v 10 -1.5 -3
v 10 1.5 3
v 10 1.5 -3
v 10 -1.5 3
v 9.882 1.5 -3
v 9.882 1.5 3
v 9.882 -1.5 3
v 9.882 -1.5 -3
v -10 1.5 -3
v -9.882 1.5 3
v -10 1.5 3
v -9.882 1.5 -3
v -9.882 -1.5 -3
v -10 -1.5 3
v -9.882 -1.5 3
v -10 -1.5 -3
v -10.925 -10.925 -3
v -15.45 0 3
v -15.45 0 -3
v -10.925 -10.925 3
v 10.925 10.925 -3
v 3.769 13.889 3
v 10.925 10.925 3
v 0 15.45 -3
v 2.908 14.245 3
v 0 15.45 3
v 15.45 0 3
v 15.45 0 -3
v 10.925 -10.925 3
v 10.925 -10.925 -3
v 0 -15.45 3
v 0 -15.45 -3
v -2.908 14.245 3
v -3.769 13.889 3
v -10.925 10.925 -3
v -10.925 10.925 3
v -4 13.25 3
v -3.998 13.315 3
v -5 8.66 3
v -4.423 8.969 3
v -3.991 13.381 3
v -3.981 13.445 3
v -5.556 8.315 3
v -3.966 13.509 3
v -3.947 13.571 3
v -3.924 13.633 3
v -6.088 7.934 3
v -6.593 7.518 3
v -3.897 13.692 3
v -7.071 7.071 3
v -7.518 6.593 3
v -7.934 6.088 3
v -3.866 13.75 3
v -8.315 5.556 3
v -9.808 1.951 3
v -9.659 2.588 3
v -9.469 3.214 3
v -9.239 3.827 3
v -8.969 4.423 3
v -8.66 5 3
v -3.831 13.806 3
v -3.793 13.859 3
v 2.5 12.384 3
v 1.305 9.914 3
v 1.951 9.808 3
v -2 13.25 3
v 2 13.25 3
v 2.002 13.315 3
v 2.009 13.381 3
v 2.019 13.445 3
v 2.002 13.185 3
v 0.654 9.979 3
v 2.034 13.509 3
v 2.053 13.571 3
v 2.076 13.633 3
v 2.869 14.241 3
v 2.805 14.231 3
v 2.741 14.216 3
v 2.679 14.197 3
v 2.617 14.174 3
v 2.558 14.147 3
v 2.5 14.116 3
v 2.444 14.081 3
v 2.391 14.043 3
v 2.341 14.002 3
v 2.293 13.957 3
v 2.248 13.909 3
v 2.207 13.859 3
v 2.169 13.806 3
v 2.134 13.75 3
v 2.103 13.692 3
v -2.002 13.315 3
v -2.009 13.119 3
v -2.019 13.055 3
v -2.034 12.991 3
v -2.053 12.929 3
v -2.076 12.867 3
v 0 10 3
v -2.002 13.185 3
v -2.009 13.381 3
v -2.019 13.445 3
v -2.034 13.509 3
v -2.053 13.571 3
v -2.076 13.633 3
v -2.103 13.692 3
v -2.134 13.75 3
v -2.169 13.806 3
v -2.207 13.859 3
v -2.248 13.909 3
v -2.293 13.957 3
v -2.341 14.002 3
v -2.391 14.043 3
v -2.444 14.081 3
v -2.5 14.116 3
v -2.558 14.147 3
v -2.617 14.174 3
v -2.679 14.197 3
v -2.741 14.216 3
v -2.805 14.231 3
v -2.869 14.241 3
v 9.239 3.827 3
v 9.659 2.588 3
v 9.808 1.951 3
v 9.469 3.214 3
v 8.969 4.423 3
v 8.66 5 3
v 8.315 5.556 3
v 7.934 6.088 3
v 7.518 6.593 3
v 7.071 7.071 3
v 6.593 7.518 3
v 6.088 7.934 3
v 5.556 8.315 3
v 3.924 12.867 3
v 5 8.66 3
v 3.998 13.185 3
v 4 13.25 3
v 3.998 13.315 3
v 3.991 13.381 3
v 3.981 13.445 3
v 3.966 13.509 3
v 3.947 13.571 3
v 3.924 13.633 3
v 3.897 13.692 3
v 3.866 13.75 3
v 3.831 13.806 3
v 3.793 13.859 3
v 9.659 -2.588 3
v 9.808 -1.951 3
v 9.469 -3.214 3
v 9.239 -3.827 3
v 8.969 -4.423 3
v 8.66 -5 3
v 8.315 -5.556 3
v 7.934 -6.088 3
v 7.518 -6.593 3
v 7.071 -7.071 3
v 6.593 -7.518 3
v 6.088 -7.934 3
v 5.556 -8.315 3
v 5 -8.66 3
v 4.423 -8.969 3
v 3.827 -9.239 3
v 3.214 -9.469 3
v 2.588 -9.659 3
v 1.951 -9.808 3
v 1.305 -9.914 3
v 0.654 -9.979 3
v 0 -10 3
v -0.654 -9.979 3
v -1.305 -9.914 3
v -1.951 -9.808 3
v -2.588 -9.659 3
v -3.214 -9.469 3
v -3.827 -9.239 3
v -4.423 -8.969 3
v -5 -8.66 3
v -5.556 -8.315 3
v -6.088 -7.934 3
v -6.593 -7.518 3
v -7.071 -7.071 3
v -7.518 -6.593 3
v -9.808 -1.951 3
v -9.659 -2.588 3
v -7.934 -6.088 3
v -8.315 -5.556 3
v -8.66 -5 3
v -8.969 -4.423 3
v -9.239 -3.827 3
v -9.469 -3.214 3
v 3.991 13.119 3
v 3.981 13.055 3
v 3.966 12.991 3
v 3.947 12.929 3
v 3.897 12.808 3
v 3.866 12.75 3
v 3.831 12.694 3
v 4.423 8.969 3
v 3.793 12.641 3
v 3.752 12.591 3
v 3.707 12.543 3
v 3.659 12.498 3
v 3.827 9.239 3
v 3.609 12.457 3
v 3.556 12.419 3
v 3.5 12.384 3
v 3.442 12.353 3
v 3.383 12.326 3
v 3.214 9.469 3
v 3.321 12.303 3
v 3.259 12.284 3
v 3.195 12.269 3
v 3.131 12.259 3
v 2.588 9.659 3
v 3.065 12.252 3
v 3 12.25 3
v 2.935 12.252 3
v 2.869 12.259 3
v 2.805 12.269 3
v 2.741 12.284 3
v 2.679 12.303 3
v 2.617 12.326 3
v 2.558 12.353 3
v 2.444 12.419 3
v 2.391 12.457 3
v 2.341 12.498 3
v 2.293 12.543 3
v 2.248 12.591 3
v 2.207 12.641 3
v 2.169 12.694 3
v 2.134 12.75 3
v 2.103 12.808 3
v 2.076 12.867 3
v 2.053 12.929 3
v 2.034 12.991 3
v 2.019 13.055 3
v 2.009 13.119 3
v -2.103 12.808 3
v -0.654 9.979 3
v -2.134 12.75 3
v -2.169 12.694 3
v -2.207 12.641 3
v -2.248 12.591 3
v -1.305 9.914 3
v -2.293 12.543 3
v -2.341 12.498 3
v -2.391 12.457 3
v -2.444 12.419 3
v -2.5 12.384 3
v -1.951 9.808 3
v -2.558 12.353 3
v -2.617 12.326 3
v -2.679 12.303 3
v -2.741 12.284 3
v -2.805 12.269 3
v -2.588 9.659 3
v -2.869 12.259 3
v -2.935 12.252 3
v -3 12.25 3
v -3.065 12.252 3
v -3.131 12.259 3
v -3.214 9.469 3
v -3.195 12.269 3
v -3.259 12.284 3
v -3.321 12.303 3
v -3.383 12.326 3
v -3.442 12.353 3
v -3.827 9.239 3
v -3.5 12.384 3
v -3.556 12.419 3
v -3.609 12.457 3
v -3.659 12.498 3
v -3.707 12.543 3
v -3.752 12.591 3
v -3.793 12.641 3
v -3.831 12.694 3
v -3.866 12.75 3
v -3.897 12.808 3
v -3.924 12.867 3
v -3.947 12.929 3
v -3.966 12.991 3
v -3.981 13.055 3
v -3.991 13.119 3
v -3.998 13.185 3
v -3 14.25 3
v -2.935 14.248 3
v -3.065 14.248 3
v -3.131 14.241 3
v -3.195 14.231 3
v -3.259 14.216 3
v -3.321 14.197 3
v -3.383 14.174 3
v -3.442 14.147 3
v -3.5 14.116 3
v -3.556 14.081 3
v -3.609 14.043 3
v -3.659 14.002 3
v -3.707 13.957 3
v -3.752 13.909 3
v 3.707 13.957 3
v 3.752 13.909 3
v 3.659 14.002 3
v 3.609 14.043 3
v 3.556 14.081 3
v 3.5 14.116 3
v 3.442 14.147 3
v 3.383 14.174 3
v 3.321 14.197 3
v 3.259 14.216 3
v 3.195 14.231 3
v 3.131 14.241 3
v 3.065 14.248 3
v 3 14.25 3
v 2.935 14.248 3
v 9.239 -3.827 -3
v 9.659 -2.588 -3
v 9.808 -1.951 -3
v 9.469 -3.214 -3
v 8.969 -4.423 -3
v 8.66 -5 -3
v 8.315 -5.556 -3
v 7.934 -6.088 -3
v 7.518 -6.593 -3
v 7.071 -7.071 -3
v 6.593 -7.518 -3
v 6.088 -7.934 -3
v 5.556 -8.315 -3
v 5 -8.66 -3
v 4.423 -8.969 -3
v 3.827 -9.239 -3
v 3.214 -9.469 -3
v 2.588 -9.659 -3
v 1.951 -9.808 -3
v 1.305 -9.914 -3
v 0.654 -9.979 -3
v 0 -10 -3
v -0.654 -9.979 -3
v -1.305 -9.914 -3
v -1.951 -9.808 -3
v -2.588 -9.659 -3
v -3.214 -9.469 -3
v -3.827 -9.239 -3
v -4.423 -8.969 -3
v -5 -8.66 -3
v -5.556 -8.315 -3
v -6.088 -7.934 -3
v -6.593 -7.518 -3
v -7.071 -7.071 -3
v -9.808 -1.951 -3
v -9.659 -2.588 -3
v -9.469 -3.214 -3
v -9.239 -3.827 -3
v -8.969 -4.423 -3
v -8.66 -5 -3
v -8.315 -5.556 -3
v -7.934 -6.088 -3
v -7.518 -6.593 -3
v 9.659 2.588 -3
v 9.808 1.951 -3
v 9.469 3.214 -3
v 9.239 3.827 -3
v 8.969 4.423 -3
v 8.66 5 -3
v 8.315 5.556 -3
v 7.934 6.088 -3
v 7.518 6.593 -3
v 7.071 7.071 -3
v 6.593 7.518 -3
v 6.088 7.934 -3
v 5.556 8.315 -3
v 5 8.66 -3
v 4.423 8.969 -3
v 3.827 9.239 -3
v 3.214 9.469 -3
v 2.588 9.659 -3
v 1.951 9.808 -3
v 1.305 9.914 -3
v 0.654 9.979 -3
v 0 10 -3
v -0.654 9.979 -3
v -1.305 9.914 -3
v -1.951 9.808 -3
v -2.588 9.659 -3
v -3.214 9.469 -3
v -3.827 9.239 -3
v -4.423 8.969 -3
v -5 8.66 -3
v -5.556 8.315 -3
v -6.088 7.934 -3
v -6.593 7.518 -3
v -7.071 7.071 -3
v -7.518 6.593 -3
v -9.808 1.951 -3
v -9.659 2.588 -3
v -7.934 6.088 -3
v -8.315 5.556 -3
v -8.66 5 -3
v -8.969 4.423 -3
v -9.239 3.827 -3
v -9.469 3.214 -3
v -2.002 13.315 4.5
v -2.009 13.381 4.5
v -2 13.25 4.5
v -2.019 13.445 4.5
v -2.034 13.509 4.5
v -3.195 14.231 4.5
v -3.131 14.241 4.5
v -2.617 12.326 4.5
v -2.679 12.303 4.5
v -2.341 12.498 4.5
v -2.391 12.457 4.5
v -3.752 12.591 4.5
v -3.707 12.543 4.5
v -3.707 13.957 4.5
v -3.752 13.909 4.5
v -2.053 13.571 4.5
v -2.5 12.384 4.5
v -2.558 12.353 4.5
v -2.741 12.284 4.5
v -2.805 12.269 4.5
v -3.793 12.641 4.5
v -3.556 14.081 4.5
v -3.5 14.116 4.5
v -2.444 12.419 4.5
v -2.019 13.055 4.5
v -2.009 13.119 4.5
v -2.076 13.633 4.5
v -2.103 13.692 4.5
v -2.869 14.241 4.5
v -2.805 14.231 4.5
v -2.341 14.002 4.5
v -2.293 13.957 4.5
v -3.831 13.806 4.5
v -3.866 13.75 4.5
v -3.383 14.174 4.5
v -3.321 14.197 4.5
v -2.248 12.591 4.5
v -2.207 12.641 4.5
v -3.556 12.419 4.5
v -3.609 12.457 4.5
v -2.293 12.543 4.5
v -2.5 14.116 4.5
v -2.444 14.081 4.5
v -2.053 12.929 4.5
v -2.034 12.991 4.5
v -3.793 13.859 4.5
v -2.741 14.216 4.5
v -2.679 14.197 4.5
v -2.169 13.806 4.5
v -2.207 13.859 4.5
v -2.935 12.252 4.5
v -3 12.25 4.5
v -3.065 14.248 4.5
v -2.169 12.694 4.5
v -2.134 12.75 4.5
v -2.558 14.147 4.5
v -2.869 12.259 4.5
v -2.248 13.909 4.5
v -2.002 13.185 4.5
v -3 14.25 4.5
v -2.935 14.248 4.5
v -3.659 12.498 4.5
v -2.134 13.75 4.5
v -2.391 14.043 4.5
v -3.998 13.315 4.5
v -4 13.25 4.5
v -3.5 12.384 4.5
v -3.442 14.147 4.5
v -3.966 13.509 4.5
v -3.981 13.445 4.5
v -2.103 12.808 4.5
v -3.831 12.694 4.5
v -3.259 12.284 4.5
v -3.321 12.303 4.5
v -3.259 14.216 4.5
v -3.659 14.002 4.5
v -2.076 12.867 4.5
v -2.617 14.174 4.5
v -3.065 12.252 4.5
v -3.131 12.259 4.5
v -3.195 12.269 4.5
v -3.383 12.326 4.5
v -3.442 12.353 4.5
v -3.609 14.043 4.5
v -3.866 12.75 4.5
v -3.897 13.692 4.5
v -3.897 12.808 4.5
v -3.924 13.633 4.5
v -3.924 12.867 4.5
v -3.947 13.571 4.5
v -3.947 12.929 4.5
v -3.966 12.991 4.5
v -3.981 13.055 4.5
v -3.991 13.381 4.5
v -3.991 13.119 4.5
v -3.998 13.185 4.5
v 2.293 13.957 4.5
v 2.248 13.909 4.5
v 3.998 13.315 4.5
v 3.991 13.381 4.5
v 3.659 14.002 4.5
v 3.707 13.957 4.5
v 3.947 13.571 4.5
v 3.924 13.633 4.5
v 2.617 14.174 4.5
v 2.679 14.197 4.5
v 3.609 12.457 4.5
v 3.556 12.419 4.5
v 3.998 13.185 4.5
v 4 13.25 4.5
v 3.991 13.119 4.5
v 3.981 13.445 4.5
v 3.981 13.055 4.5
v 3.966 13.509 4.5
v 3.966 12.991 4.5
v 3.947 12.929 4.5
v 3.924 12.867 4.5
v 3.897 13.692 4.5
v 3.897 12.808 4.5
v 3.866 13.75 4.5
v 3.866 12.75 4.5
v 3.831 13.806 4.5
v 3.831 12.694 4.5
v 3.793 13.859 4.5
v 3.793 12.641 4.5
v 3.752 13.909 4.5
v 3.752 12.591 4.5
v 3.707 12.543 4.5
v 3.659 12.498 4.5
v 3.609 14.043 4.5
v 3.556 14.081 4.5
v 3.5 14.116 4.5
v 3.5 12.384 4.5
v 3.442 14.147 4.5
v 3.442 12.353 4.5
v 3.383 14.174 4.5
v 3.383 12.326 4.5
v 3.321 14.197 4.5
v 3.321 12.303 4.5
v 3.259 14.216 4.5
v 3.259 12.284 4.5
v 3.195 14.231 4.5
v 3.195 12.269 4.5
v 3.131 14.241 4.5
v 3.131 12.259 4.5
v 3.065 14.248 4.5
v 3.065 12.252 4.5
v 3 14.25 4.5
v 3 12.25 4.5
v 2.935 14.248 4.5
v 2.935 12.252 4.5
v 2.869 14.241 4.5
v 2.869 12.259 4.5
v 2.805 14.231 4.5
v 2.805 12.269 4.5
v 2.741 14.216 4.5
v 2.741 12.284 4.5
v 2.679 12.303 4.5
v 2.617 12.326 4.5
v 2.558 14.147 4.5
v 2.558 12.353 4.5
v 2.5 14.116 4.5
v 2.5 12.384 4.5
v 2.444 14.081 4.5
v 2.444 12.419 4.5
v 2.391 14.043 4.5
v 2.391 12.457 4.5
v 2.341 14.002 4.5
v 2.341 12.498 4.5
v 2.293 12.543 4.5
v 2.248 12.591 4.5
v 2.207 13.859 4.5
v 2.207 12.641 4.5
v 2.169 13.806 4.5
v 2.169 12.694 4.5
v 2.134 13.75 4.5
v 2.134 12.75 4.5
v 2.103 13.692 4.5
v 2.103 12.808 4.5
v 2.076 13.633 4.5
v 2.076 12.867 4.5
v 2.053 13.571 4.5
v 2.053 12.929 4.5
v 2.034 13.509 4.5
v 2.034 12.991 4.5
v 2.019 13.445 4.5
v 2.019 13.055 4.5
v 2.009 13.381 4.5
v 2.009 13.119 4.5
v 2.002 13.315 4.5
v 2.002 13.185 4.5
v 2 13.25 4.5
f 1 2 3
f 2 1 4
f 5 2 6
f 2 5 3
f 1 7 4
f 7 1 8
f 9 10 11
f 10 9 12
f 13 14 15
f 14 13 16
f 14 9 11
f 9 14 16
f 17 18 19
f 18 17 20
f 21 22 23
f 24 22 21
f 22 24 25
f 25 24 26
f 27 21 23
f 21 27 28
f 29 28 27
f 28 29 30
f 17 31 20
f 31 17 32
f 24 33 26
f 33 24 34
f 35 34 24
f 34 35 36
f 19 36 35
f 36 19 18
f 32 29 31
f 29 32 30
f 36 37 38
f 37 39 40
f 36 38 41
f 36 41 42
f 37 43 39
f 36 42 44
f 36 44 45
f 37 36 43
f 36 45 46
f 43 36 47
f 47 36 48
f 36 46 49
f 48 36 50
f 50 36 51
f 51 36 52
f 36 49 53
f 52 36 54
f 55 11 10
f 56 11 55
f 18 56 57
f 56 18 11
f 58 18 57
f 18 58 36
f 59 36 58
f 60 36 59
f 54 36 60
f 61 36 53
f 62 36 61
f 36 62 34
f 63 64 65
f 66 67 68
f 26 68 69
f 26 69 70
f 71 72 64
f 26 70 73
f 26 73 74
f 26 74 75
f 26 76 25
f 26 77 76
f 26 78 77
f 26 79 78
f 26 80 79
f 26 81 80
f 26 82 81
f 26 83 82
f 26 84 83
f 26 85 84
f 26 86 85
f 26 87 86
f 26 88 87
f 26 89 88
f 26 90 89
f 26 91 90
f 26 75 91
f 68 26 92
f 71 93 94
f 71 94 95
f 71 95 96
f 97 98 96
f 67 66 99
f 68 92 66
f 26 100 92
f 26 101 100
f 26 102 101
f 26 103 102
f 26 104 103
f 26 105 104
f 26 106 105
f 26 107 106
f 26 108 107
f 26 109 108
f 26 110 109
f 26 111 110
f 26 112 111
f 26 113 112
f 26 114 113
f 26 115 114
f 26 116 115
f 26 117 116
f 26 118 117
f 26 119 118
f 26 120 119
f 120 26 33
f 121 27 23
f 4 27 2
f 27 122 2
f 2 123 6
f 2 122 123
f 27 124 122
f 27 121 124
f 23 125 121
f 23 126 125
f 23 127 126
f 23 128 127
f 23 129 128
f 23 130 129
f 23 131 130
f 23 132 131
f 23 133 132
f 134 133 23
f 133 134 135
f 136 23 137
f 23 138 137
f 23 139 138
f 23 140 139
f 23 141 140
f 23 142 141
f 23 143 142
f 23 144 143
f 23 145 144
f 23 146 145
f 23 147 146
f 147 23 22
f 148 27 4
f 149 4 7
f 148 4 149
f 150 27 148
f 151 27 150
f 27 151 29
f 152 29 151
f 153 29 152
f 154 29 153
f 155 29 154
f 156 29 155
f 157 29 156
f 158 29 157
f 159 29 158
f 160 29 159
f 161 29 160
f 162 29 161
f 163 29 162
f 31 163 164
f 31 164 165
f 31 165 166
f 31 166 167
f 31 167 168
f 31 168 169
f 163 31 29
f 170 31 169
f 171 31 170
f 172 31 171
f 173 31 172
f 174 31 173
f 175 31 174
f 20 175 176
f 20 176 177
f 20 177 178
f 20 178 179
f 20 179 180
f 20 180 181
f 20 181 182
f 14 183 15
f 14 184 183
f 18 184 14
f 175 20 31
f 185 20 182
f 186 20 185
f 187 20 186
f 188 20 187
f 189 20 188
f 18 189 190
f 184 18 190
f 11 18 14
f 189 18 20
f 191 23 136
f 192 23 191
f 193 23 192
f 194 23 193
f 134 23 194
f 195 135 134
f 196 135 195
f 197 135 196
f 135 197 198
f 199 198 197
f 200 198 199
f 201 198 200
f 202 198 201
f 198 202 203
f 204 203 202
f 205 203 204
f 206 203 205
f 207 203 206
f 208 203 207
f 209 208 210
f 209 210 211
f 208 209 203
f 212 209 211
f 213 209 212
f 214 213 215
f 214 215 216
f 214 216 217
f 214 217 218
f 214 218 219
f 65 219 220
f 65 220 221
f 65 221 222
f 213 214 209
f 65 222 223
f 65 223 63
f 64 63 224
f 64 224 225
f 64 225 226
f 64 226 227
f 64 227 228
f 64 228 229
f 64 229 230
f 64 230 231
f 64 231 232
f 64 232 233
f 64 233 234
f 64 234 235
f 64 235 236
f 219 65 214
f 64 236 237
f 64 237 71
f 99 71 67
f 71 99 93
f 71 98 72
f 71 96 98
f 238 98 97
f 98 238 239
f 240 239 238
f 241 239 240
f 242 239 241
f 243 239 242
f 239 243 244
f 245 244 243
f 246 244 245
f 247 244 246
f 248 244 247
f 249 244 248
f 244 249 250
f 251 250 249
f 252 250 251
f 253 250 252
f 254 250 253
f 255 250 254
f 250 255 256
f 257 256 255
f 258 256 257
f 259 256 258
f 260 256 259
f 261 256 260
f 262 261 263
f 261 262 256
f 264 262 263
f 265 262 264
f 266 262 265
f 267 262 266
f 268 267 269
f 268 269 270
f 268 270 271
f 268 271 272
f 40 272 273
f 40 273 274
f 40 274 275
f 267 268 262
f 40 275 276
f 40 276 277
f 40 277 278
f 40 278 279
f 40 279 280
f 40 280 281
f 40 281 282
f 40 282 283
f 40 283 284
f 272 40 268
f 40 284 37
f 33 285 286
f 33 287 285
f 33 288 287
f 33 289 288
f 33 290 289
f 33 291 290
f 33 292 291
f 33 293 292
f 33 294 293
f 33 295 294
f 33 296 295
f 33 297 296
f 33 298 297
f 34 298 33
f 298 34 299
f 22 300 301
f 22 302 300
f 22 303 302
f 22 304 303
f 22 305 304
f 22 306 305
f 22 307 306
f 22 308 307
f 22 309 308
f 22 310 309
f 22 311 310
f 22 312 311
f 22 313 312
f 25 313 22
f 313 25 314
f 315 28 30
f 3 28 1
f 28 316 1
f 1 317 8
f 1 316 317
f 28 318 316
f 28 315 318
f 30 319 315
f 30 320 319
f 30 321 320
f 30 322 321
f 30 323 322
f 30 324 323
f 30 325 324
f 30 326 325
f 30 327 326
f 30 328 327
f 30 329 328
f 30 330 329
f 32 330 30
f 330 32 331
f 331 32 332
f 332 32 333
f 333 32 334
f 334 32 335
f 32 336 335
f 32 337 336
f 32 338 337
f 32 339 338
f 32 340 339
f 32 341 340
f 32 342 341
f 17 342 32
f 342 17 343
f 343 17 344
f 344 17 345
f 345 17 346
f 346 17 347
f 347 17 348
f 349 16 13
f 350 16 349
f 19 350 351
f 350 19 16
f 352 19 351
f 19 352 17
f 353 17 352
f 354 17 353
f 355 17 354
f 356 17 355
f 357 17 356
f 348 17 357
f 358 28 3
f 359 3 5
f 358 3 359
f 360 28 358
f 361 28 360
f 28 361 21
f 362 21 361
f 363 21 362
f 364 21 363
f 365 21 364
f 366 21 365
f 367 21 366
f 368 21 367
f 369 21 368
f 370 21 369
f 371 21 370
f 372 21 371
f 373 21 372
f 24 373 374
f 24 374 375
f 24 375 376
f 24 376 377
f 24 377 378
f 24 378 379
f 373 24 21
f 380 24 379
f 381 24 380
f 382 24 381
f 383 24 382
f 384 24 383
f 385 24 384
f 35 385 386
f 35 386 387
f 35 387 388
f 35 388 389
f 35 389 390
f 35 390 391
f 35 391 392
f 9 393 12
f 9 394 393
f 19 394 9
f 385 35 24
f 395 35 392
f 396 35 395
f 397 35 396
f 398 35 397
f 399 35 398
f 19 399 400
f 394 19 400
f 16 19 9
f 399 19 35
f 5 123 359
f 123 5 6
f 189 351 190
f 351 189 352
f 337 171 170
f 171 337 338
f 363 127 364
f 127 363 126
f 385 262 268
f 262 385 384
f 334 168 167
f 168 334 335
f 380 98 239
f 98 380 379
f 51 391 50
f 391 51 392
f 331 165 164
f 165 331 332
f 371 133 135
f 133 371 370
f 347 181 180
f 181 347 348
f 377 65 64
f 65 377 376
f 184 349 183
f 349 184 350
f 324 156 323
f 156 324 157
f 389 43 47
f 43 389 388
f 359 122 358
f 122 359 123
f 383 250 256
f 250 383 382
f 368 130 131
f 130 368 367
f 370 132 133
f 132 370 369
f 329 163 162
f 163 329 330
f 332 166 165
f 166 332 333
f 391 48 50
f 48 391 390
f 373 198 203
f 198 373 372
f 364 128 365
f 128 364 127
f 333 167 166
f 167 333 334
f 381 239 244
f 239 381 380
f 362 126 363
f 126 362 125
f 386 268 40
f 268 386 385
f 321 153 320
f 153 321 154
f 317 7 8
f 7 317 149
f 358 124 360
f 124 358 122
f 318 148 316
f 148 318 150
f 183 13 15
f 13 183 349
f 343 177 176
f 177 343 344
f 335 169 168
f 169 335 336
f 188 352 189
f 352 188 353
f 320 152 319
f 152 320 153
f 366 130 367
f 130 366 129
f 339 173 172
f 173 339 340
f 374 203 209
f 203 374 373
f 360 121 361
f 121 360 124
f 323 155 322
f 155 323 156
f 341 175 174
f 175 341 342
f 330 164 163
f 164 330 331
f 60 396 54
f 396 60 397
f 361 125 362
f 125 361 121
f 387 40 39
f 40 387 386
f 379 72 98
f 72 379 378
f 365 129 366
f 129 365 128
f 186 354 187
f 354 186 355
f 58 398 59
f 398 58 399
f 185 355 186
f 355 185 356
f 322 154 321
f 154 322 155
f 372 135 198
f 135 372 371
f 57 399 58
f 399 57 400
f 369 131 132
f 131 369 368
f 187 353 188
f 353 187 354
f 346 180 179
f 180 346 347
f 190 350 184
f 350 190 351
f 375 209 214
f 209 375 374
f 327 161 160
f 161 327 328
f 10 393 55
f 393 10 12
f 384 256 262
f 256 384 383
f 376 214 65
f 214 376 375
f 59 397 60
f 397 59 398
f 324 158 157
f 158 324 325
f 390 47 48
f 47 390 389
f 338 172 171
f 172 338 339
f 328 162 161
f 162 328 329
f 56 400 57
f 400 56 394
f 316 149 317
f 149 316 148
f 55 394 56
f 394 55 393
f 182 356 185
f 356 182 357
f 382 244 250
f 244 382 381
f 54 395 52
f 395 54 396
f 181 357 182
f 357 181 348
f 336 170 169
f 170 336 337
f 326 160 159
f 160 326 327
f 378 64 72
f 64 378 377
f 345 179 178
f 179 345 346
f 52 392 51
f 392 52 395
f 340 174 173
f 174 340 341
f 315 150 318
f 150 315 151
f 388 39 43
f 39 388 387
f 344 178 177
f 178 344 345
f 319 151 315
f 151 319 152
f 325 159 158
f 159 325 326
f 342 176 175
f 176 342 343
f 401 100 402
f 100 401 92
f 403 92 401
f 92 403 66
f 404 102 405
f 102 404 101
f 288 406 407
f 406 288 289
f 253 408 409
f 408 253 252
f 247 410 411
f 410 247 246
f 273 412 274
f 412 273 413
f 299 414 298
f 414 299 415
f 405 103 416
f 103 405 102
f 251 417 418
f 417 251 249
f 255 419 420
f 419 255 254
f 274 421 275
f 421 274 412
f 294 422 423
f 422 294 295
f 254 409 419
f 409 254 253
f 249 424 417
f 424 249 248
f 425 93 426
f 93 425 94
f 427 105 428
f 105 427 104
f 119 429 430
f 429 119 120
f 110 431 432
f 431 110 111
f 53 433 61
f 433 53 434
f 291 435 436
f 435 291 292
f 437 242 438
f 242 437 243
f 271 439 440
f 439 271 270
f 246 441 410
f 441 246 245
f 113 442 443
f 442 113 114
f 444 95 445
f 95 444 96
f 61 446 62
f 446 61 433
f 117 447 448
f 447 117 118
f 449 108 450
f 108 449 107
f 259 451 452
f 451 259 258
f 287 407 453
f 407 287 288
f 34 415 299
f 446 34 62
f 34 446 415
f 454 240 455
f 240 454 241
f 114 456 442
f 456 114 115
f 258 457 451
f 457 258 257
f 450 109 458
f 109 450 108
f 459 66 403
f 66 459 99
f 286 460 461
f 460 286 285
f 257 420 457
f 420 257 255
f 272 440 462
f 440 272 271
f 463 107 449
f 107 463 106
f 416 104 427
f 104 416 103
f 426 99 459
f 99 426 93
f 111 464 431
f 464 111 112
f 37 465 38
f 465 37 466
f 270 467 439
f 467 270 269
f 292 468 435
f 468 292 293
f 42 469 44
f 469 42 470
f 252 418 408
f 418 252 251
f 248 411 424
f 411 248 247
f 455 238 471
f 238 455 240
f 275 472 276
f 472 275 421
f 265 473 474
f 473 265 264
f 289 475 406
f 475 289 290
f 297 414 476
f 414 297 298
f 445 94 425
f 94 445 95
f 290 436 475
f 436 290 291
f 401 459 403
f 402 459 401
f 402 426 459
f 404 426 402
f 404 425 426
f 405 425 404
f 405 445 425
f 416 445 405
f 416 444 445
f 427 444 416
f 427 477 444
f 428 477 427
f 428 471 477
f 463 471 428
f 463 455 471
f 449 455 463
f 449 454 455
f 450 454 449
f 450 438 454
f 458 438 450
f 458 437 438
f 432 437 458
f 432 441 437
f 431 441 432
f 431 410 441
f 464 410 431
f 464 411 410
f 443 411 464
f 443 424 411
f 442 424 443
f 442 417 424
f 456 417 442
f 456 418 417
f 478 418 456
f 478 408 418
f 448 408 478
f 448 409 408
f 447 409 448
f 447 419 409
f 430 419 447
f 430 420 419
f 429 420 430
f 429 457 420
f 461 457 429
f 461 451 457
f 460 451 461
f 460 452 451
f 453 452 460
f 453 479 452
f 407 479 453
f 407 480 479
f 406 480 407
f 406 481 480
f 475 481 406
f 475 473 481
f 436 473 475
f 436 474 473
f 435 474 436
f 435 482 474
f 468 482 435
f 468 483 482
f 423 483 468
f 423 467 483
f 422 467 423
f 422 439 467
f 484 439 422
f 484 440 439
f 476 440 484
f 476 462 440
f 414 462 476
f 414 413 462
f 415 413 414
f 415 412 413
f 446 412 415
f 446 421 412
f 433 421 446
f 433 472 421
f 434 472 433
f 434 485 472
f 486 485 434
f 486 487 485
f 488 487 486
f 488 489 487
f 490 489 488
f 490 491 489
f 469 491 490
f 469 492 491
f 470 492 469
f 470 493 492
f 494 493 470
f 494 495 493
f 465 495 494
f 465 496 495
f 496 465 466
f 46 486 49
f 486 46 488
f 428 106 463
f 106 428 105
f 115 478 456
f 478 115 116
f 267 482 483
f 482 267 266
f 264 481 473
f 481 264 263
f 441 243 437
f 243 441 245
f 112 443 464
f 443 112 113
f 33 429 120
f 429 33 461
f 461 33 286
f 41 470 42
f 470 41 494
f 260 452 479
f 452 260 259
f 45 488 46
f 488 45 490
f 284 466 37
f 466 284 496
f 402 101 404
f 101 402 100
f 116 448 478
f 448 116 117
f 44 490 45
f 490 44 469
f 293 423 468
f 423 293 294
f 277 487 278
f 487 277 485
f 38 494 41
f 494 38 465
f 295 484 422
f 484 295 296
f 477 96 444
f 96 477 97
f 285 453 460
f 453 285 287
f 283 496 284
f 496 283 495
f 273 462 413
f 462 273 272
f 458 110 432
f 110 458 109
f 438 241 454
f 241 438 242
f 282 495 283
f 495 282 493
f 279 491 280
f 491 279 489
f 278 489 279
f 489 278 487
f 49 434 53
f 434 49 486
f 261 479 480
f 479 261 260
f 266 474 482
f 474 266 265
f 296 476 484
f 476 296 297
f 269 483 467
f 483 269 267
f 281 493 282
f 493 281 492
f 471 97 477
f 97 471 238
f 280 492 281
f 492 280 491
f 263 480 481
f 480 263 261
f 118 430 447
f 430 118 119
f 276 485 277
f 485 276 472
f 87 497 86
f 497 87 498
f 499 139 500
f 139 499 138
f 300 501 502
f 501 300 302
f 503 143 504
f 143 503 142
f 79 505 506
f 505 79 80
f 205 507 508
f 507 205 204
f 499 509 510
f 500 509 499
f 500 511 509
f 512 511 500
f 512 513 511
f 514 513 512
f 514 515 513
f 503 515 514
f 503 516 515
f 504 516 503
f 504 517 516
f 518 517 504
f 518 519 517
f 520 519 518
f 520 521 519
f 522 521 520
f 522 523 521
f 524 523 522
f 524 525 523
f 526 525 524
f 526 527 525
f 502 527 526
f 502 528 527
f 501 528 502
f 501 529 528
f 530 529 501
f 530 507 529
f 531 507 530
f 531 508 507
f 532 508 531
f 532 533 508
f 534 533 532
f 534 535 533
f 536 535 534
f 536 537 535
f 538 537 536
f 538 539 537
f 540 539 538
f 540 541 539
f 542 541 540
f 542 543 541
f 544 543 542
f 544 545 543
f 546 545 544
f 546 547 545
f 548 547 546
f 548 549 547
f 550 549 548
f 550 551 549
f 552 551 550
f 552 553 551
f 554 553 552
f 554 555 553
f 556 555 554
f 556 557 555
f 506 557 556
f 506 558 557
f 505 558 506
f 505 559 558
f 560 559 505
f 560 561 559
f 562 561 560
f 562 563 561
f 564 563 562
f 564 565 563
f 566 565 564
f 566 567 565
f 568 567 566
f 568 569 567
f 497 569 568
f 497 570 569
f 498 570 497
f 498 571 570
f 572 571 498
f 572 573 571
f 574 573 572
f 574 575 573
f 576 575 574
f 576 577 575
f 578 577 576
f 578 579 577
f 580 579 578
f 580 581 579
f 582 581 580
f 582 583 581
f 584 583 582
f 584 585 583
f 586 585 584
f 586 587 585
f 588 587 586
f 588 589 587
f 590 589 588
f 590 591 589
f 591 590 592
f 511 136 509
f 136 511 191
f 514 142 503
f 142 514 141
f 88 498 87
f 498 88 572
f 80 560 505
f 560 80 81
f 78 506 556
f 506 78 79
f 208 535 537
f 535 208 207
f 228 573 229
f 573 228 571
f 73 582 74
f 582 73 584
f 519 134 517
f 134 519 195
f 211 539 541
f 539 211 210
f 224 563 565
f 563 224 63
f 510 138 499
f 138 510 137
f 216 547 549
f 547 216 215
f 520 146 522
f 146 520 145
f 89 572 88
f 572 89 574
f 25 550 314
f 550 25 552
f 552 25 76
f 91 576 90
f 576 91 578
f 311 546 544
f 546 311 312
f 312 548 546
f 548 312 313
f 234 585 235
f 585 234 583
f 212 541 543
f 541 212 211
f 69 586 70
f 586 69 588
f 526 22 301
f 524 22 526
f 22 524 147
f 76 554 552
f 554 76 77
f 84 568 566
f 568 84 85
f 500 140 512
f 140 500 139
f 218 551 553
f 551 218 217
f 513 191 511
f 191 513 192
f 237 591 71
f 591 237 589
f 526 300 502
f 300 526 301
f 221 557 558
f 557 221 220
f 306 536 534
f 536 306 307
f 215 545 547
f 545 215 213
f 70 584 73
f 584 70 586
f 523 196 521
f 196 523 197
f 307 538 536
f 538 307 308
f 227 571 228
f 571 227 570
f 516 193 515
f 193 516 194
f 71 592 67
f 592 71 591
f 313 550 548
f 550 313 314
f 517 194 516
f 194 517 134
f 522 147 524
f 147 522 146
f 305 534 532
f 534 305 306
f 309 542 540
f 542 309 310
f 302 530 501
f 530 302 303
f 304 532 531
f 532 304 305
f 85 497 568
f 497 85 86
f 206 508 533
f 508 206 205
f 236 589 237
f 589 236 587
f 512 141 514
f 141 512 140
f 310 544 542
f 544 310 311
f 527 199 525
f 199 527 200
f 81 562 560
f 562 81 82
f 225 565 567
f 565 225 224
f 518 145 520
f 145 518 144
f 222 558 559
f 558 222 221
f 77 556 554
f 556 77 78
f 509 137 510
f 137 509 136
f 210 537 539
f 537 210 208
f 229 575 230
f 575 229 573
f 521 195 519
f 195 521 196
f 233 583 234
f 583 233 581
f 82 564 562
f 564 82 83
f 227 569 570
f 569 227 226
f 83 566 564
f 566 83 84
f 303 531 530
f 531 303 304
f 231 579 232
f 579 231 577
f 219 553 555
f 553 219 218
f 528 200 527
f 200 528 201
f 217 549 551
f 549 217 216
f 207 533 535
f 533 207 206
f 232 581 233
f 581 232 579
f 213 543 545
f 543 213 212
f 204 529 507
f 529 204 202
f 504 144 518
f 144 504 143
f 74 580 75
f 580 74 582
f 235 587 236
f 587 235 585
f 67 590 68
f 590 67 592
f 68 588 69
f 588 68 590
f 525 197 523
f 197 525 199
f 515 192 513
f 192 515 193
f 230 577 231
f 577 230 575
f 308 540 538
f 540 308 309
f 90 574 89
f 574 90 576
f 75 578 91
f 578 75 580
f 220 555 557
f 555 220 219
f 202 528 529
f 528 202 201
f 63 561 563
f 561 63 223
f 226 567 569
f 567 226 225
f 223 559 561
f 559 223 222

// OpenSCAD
$fn=96;

bbox_x = 29.8;
bbox_y = 30.9;
thk = 6.0;

outer_r = bbox_y/2;          // 15.45
inner_d = 20.0;
inner_r = inner_d/2;

key_w = 3.0;
key_depth = 2.0;

pin_d = 2.0;
pin_h = 1.5;
pin_offset_from_edge = 2.2;

module oct_outer(h=thk, r=outer_r){
    cylinder(h=h, r=r, $fn=8, center=true);
}

module bore(h=thk+0.4, r=inner_r){
    cylinder(h=h, r=r, center=true);
}

module keyway_cuts(h=thk+0.6, r=inner_r, w=key_w, depth=key_depth){
    for (a=[0,180]){
        rotate([0,0,a])
            translate([r - depth/2, 0, 0])
                cube([depth, w, h], center=true);
    }
}

module pins(){
    y_edge = bbox_y/2;
    y_pin = y_edge - pin_offset_from_edge;
    x_sep = 6.0;
    for (x=[-x_sep/2, x_sep/2]){
        translate([x, y_pin, thk/2 + pin_h/2])
            cylinder(h=pin_h, d=pin_d, center=true);
    }
}

module ring_body(){
    difference(){
        oct_outer();
        bore();
        keyway_cuts();
    }
}

union(){
    ring_body();
    pins();
}
